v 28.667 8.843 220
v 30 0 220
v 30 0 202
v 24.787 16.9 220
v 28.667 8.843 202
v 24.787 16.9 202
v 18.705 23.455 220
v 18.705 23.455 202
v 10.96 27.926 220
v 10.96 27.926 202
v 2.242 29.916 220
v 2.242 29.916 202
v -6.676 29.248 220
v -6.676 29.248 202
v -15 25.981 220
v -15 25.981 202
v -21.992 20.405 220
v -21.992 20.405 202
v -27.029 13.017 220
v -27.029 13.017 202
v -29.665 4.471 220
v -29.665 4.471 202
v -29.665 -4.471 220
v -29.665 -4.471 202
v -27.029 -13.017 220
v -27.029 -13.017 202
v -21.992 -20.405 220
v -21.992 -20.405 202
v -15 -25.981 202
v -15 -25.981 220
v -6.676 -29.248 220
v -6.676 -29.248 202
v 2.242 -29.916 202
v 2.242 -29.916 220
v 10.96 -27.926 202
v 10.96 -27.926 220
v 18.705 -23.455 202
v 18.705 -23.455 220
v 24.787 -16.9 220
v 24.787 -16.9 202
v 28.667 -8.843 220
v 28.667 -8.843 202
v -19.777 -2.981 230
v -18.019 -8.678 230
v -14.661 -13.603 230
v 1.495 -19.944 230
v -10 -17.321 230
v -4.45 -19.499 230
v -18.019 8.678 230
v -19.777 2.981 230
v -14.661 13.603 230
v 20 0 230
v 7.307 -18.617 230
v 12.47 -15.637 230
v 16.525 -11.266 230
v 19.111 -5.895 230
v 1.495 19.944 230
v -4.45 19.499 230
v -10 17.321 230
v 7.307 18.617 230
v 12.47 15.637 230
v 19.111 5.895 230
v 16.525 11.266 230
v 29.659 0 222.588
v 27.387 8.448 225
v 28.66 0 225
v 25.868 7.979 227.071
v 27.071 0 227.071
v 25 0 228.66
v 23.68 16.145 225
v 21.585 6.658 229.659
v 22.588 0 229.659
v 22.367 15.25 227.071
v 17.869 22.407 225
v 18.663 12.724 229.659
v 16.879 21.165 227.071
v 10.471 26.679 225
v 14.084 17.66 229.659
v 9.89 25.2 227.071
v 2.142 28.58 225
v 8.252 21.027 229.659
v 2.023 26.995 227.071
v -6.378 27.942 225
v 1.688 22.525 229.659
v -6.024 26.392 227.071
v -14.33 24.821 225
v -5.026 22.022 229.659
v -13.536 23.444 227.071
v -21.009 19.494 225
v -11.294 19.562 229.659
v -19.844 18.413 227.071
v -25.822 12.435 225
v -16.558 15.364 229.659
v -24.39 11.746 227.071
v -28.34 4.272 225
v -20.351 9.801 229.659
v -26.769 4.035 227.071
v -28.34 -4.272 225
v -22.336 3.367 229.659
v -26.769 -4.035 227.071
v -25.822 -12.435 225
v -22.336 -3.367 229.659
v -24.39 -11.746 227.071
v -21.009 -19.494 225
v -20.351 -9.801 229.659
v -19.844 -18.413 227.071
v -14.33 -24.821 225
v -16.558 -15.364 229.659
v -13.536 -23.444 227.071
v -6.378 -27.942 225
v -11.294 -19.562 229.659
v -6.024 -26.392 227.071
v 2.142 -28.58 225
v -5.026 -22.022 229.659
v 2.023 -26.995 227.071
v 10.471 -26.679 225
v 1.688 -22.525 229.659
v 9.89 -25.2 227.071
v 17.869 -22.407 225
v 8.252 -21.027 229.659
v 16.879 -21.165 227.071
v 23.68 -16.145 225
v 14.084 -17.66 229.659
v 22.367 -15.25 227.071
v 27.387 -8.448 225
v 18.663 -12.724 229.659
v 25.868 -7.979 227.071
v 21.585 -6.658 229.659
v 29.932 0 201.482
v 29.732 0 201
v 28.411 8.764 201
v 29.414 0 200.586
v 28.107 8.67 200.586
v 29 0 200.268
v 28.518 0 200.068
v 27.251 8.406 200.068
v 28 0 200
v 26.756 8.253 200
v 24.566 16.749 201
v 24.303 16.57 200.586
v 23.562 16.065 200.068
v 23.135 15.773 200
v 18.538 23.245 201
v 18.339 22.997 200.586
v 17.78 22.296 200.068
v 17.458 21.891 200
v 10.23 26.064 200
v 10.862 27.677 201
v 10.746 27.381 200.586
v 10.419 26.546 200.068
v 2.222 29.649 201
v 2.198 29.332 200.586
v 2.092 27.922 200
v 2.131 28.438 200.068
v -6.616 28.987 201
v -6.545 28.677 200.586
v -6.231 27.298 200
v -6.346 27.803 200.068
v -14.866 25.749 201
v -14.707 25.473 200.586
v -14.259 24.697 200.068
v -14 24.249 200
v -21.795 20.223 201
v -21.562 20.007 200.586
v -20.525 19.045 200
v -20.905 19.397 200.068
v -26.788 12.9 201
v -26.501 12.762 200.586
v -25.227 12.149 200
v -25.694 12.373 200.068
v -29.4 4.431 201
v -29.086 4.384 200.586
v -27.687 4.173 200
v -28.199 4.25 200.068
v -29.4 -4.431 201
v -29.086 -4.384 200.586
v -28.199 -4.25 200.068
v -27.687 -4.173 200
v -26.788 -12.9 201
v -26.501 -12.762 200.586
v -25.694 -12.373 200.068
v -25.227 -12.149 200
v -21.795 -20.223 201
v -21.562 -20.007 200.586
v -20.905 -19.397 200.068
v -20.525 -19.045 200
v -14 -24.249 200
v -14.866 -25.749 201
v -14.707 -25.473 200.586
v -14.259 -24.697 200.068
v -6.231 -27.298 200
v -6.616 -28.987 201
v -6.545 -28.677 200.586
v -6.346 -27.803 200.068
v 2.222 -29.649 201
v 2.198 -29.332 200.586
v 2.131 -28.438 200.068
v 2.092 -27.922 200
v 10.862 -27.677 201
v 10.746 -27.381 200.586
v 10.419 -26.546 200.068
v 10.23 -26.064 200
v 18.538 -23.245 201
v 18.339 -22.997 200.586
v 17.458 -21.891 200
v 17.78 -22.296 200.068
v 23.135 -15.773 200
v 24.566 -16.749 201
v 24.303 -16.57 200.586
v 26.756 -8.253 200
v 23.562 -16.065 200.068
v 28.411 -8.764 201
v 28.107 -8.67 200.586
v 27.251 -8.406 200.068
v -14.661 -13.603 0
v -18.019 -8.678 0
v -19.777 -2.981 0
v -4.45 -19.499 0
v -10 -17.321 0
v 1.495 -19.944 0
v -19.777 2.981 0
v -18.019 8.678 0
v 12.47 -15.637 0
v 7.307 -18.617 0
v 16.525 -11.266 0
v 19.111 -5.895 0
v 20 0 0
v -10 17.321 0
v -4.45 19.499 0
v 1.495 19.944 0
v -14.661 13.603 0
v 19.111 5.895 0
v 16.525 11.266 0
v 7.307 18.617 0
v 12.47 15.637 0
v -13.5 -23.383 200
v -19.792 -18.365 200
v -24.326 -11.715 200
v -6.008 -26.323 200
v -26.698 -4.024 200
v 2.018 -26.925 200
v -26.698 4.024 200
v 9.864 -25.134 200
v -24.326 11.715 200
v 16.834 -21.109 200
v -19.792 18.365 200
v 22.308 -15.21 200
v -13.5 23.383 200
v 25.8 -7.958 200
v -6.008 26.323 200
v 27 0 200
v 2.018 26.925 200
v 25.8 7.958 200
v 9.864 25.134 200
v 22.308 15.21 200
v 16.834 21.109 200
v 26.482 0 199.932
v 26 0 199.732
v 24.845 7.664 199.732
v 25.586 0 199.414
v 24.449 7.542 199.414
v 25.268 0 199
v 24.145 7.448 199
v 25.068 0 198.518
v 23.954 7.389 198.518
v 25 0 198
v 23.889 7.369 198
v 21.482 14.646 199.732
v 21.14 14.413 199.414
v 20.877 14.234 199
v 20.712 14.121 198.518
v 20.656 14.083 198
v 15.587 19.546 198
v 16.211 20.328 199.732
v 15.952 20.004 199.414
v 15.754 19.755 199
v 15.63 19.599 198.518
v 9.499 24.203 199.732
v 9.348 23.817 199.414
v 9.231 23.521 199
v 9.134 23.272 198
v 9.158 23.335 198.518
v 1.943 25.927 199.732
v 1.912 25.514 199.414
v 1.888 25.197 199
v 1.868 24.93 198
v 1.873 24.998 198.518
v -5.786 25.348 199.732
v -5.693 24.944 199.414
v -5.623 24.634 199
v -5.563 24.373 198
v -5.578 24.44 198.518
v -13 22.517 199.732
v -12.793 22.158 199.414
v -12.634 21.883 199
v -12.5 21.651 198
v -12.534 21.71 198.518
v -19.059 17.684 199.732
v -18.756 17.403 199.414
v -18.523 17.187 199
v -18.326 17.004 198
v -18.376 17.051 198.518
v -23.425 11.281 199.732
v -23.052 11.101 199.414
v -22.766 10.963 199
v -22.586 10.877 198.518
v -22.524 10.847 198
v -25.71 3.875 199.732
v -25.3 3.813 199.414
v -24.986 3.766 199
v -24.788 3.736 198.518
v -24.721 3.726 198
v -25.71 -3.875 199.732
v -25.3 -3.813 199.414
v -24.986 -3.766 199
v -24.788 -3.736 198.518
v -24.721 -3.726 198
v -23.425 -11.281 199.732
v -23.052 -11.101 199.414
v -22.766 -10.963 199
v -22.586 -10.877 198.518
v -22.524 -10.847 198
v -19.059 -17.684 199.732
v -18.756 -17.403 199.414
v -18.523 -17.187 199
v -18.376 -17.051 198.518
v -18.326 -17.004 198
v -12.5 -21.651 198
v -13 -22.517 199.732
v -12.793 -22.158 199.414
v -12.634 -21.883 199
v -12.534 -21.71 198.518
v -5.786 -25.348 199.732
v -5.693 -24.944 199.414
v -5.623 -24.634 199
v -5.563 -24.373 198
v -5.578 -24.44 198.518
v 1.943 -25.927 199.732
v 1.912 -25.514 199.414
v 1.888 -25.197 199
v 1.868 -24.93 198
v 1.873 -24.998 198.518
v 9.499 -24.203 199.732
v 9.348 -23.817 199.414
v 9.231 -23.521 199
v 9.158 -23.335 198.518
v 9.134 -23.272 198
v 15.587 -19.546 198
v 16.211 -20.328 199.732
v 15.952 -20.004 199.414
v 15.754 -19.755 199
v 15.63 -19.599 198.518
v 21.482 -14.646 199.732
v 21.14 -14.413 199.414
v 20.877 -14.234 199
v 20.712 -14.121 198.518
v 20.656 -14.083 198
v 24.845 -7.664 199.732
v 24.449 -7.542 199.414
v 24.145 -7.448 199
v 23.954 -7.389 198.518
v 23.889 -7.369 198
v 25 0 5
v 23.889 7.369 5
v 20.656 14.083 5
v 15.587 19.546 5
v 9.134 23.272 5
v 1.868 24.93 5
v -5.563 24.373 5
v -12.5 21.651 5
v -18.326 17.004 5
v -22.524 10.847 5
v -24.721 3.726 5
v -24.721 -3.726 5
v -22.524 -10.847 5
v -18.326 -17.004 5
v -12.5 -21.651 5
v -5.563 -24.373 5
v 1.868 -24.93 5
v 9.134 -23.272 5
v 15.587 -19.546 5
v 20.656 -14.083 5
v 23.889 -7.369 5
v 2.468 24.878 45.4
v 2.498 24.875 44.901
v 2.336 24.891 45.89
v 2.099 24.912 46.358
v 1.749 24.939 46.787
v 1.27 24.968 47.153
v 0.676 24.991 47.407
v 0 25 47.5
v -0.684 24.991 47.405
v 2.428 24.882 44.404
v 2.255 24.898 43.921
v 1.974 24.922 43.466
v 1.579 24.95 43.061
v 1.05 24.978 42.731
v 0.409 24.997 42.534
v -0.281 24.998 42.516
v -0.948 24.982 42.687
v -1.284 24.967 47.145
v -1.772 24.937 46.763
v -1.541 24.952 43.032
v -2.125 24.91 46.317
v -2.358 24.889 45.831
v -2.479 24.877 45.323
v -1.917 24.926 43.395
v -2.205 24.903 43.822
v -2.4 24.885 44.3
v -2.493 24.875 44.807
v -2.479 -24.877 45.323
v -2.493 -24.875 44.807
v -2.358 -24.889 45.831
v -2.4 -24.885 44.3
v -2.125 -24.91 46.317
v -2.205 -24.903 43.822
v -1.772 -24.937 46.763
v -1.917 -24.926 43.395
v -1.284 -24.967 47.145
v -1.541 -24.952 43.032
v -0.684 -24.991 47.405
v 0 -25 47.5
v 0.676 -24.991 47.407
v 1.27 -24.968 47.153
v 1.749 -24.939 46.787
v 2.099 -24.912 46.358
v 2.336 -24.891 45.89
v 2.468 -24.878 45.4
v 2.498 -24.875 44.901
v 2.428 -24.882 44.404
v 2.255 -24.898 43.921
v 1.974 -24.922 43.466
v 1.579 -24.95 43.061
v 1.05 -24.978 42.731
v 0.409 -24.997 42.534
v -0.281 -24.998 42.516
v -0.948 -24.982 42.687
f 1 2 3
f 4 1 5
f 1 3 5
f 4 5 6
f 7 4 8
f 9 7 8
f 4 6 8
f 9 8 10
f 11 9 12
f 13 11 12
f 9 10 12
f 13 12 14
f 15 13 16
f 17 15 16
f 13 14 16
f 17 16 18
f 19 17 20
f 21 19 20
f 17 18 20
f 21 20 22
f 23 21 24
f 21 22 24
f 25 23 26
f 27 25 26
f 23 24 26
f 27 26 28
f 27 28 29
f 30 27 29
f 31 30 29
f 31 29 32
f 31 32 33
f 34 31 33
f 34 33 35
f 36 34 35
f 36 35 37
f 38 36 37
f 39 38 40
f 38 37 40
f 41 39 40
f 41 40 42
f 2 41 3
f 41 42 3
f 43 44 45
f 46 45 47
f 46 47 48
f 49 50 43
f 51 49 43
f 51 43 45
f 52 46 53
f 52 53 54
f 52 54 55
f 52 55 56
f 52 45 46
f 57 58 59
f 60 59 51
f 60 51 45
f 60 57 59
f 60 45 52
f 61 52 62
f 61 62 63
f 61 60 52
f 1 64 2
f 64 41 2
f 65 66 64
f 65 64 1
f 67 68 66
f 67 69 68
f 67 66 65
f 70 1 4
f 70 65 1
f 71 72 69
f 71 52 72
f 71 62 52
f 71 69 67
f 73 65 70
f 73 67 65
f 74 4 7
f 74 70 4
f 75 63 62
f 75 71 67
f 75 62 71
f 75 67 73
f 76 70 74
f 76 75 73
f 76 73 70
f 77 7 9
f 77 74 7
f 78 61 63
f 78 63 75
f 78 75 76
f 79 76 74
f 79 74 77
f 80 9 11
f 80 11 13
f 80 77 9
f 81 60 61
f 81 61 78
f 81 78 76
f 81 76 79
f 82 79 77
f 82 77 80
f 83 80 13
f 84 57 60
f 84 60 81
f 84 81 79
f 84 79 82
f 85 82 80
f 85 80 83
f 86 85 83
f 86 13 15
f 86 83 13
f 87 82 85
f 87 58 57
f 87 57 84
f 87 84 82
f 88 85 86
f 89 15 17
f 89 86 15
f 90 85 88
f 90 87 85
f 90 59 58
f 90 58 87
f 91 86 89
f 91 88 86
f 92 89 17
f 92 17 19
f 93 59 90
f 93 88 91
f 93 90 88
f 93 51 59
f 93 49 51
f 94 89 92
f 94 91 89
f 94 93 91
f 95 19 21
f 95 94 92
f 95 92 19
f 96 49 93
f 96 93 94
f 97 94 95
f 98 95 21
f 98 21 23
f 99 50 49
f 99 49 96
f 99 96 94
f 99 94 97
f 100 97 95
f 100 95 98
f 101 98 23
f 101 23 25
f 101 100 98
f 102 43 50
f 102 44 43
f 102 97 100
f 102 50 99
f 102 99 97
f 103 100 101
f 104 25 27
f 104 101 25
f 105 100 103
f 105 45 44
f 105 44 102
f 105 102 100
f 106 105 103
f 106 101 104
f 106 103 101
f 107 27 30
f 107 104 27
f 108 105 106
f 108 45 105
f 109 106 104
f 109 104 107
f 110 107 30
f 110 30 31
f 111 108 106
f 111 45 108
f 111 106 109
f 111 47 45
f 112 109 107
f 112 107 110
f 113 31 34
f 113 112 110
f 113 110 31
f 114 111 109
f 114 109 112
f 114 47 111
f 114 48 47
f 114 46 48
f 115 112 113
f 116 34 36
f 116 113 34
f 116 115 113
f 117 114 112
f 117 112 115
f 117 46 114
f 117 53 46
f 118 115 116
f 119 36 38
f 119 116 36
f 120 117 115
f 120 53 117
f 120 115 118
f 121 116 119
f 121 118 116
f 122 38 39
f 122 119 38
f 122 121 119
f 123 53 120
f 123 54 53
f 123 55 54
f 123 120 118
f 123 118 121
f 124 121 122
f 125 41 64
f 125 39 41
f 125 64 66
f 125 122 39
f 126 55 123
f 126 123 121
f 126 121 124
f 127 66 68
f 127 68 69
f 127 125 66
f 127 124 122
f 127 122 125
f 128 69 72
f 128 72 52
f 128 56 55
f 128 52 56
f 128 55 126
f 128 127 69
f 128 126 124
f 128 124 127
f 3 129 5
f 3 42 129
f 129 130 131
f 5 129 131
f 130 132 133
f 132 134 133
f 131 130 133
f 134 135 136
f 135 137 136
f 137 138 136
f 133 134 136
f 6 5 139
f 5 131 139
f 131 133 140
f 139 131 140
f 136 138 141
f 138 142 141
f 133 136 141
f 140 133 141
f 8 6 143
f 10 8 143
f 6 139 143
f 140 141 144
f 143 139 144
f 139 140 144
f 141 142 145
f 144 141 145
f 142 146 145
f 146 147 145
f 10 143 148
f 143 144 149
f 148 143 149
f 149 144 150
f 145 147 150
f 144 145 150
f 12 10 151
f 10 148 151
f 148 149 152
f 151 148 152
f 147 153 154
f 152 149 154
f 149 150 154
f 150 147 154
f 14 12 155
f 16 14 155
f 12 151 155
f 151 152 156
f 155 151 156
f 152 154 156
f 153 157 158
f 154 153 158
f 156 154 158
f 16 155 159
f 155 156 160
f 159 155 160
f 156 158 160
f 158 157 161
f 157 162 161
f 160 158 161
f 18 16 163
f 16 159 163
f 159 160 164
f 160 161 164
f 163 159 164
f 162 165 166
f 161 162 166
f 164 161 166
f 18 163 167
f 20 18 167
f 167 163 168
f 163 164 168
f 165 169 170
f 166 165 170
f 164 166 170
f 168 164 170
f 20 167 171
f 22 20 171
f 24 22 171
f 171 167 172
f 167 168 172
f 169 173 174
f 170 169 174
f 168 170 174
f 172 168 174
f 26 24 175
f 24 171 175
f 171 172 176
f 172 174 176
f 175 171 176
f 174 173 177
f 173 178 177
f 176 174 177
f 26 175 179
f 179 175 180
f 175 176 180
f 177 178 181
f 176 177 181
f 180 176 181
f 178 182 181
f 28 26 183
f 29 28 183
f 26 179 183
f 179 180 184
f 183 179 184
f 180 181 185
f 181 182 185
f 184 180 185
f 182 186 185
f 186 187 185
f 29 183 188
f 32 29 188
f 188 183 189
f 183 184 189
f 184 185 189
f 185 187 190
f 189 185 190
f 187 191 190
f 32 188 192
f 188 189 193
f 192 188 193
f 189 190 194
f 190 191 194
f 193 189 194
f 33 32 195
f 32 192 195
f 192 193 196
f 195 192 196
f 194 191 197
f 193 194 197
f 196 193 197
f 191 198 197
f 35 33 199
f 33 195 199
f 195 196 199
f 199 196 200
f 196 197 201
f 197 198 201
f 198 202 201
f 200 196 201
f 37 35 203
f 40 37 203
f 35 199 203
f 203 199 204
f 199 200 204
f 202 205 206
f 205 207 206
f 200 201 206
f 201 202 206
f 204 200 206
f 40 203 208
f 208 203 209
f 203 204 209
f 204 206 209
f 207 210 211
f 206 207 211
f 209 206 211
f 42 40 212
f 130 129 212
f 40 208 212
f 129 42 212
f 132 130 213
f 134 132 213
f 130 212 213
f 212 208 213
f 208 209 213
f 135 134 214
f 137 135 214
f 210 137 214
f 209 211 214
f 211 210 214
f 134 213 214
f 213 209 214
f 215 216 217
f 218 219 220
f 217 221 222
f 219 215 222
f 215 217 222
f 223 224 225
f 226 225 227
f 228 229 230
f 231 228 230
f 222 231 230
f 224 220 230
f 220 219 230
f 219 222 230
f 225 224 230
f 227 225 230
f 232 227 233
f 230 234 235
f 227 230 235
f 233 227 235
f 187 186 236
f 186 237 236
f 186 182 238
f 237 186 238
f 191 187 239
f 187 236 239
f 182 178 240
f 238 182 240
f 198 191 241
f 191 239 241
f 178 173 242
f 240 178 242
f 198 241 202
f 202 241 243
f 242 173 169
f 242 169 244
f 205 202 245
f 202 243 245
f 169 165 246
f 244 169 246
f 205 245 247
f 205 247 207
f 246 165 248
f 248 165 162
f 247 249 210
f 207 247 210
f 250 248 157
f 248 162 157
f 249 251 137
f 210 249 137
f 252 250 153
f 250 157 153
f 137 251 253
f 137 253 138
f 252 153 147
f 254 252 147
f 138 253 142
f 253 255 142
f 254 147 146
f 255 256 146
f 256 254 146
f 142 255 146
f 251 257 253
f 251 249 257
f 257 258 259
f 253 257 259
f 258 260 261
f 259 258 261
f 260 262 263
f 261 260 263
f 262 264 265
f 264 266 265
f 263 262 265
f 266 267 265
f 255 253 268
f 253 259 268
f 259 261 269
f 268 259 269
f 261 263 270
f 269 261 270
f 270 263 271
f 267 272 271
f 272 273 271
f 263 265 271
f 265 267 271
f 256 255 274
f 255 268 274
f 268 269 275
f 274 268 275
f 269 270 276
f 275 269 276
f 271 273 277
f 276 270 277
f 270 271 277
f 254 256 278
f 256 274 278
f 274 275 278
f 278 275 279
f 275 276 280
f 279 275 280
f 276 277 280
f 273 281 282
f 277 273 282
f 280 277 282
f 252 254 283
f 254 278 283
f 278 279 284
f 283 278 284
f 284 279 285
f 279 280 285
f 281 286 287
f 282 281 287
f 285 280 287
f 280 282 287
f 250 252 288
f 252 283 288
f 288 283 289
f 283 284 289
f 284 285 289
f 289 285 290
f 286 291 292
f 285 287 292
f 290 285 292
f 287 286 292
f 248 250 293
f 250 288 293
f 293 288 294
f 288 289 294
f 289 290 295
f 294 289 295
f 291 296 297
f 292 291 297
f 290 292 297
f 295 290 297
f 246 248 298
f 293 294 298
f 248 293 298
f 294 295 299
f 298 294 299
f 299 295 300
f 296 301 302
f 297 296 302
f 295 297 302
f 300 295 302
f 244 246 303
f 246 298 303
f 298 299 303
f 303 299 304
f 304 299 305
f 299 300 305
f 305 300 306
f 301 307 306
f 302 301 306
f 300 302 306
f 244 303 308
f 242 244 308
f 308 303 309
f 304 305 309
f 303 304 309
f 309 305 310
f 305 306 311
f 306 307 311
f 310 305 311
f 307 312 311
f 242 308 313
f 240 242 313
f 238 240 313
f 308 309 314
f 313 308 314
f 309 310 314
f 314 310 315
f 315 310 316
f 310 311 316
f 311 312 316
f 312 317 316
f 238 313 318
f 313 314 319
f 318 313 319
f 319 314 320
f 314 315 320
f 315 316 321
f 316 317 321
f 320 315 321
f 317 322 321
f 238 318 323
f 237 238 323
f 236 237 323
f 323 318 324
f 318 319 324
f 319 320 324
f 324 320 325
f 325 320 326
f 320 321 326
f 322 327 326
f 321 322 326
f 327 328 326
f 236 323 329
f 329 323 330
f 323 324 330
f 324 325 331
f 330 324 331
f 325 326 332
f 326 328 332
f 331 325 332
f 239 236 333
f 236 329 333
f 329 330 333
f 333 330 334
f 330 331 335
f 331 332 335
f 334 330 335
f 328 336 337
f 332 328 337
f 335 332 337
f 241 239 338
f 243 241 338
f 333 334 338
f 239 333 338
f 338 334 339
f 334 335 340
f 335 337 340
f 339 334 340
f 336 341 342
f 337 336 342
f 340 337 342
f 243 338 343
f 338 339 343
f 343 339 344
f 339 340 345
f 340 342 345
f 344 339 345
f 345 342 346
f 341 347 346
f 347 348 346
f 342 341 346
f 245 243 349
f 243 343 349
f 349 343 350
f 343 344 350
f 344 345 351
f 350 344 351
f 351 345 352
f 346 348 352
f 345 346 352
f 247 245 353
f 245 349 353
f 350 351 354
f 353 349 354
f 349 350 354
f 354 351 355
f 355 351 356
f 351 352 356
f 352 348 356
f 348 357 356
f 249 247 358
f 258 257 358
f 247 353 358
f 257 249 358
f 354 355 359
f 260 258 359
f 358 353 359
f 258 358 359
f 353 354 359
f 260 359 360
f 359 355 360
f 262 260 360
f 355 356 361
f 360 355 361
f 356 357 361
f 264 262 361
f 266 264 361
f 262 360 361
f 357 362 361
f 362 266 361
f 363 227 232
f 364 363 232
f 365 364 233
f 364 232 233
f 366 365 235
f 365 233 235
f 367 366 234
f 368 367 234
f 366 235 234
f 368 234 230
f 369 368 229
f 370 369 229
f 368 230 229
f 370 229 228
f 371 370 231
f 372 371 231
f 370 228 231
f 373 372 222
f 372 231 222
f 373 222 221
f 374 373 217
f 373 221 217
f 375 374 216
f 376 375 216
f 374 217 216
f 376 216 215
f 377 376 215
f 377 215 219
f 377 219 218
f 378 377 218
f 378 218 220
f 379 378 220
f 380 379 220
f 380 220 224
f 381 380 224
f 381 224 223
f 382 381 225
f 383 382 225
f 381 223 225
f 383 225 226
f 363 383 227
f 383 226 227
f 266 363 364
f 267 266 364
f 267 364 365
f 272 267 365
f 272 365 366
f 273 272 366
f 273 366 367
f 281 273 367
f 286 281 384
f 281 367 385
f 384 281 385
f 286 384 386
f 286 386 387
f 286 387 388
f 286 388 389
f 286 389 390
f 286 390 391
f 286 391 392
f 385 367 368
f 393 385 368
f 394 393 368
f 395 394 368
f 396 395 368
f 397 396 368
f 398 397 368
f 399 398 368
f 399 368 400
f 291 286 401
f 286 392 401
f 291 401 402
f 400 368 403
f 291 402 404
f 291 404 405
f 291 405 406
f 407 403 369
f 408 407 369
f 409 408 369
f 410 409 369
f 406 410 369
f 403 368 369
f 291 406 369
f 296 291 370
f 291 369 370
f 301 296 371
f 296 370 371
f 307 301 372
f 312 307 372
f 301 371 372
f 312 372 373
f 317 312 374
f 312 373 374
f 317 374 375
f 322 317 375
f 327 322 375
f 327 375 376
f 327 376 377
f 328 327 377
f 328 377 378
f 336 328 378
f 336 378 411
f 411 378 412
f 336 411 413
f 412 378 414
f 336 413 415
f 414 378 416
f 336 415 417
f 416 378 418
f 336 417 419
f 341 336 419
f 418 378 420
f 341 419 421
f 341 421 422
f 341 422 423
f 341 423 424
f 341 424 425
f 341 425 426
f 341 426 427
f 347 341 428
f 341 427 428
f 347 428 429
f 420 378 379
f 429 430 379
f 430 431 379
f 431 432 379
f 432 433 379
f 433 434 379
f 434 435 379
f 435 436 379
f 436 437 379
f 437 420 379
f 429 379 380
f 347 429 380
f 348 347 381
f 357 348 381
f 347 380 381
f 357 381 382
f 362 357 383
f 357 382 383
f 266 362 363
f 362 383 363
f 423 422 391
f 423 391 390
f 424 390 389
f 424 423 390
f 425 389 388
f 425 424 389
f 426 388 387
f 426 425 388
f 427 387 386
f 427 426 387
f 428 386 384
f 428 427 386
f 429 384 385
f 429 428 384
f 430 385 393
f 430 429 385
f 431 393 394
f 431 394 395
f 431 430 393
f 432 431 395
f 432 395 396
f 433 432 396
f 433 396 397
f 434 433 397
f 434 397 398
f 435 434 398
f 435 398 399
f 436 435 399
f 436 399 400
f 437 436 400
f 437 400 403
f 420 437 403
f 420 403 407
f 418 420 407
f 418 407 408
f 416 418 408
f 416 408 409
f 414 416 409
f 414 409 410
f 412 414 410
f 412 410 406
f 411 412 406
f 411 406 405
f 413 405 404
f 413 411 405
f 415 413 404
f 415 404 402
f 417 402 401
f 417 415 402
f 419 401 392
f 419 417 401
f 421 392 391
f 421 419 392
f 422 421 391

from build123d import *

# Parameters (mm, degrees)
SKETCH1_R               = 25
BOSS_EXTRUDE1_DEPTH     = 200
SKETCH2_R               = 30
BOSS_EXTRUDE2_DEPTH     = 30
FILLET1_R               = 10
FILLET2_R               = 2
CHAMFER1_SIZE           = 5
CUT_EXTRUDE1_DEPTH      = 234.880311271
CUT_EXTRUDE1_DEPTH_BACK = 234.880311271
SKETCH3_R               = 2.5


with BuildPart() as part:
    # Sketch1 → Boss-Extrude1 (new body)
    with BuildSketch(Plane.XY):
        Circle(SKETCH1_R)
    extrude(amount=BOSS_EXTRUDE1_DEPTH)

    # Sketch2 → Boss-Extrude2 (add)
    with BuildSketch(Plane.XY.offset(200)):
        Circle(SKETCH2_R)
    extrude(amount=BOSS_EXTRUDE2_DEPTH)

    # Fillet1
    fillet1_edges = [part.edges().sort_by_distance(p)[0] for p in [
        (-30, 0, 230),
    ]]
    fillet(fillet1_edges, radius=FILLET1_R)

    # Fillet2
    fillet2_edges = [part.edges().sort_by_distance(p)[0] for p in [
        (-25, 0, 200),
        (-30, 0, 200),
    ]]
    fillet(fillet2_edges, radius=FILLET2_R)

    # Chamfer1
    chamfer1_edges = [part.edges().sort_by_distance(p)[0] for p in [
        (-25, 0, 0),
    ]]
    chamfer(chamfer1_edges, length=CHAMFER1_SIZE)

    # Sketch3 → Cut-Extrude1 (cut, two sides: drawn at the far end of the back side and taken through both)
    with BuildSketch(Plane(origin=(0, 0, 0), x_dir=(1, 0, 0), z_dir=(0, 1, 0)).offset(-CUT_EXTRUDE1_DEPTH_BACK)):
        with Locations(Location((0, -45, 0), (0, 0, 270))):
            Circle(SKETCH3_R)
    extrude(amount=CUT_EXTRUDE1_DEPTH + CUT_EXTRUDE1_DEPTH_BACK, mode=Mode.SUBTRACT)


solid = part.part
